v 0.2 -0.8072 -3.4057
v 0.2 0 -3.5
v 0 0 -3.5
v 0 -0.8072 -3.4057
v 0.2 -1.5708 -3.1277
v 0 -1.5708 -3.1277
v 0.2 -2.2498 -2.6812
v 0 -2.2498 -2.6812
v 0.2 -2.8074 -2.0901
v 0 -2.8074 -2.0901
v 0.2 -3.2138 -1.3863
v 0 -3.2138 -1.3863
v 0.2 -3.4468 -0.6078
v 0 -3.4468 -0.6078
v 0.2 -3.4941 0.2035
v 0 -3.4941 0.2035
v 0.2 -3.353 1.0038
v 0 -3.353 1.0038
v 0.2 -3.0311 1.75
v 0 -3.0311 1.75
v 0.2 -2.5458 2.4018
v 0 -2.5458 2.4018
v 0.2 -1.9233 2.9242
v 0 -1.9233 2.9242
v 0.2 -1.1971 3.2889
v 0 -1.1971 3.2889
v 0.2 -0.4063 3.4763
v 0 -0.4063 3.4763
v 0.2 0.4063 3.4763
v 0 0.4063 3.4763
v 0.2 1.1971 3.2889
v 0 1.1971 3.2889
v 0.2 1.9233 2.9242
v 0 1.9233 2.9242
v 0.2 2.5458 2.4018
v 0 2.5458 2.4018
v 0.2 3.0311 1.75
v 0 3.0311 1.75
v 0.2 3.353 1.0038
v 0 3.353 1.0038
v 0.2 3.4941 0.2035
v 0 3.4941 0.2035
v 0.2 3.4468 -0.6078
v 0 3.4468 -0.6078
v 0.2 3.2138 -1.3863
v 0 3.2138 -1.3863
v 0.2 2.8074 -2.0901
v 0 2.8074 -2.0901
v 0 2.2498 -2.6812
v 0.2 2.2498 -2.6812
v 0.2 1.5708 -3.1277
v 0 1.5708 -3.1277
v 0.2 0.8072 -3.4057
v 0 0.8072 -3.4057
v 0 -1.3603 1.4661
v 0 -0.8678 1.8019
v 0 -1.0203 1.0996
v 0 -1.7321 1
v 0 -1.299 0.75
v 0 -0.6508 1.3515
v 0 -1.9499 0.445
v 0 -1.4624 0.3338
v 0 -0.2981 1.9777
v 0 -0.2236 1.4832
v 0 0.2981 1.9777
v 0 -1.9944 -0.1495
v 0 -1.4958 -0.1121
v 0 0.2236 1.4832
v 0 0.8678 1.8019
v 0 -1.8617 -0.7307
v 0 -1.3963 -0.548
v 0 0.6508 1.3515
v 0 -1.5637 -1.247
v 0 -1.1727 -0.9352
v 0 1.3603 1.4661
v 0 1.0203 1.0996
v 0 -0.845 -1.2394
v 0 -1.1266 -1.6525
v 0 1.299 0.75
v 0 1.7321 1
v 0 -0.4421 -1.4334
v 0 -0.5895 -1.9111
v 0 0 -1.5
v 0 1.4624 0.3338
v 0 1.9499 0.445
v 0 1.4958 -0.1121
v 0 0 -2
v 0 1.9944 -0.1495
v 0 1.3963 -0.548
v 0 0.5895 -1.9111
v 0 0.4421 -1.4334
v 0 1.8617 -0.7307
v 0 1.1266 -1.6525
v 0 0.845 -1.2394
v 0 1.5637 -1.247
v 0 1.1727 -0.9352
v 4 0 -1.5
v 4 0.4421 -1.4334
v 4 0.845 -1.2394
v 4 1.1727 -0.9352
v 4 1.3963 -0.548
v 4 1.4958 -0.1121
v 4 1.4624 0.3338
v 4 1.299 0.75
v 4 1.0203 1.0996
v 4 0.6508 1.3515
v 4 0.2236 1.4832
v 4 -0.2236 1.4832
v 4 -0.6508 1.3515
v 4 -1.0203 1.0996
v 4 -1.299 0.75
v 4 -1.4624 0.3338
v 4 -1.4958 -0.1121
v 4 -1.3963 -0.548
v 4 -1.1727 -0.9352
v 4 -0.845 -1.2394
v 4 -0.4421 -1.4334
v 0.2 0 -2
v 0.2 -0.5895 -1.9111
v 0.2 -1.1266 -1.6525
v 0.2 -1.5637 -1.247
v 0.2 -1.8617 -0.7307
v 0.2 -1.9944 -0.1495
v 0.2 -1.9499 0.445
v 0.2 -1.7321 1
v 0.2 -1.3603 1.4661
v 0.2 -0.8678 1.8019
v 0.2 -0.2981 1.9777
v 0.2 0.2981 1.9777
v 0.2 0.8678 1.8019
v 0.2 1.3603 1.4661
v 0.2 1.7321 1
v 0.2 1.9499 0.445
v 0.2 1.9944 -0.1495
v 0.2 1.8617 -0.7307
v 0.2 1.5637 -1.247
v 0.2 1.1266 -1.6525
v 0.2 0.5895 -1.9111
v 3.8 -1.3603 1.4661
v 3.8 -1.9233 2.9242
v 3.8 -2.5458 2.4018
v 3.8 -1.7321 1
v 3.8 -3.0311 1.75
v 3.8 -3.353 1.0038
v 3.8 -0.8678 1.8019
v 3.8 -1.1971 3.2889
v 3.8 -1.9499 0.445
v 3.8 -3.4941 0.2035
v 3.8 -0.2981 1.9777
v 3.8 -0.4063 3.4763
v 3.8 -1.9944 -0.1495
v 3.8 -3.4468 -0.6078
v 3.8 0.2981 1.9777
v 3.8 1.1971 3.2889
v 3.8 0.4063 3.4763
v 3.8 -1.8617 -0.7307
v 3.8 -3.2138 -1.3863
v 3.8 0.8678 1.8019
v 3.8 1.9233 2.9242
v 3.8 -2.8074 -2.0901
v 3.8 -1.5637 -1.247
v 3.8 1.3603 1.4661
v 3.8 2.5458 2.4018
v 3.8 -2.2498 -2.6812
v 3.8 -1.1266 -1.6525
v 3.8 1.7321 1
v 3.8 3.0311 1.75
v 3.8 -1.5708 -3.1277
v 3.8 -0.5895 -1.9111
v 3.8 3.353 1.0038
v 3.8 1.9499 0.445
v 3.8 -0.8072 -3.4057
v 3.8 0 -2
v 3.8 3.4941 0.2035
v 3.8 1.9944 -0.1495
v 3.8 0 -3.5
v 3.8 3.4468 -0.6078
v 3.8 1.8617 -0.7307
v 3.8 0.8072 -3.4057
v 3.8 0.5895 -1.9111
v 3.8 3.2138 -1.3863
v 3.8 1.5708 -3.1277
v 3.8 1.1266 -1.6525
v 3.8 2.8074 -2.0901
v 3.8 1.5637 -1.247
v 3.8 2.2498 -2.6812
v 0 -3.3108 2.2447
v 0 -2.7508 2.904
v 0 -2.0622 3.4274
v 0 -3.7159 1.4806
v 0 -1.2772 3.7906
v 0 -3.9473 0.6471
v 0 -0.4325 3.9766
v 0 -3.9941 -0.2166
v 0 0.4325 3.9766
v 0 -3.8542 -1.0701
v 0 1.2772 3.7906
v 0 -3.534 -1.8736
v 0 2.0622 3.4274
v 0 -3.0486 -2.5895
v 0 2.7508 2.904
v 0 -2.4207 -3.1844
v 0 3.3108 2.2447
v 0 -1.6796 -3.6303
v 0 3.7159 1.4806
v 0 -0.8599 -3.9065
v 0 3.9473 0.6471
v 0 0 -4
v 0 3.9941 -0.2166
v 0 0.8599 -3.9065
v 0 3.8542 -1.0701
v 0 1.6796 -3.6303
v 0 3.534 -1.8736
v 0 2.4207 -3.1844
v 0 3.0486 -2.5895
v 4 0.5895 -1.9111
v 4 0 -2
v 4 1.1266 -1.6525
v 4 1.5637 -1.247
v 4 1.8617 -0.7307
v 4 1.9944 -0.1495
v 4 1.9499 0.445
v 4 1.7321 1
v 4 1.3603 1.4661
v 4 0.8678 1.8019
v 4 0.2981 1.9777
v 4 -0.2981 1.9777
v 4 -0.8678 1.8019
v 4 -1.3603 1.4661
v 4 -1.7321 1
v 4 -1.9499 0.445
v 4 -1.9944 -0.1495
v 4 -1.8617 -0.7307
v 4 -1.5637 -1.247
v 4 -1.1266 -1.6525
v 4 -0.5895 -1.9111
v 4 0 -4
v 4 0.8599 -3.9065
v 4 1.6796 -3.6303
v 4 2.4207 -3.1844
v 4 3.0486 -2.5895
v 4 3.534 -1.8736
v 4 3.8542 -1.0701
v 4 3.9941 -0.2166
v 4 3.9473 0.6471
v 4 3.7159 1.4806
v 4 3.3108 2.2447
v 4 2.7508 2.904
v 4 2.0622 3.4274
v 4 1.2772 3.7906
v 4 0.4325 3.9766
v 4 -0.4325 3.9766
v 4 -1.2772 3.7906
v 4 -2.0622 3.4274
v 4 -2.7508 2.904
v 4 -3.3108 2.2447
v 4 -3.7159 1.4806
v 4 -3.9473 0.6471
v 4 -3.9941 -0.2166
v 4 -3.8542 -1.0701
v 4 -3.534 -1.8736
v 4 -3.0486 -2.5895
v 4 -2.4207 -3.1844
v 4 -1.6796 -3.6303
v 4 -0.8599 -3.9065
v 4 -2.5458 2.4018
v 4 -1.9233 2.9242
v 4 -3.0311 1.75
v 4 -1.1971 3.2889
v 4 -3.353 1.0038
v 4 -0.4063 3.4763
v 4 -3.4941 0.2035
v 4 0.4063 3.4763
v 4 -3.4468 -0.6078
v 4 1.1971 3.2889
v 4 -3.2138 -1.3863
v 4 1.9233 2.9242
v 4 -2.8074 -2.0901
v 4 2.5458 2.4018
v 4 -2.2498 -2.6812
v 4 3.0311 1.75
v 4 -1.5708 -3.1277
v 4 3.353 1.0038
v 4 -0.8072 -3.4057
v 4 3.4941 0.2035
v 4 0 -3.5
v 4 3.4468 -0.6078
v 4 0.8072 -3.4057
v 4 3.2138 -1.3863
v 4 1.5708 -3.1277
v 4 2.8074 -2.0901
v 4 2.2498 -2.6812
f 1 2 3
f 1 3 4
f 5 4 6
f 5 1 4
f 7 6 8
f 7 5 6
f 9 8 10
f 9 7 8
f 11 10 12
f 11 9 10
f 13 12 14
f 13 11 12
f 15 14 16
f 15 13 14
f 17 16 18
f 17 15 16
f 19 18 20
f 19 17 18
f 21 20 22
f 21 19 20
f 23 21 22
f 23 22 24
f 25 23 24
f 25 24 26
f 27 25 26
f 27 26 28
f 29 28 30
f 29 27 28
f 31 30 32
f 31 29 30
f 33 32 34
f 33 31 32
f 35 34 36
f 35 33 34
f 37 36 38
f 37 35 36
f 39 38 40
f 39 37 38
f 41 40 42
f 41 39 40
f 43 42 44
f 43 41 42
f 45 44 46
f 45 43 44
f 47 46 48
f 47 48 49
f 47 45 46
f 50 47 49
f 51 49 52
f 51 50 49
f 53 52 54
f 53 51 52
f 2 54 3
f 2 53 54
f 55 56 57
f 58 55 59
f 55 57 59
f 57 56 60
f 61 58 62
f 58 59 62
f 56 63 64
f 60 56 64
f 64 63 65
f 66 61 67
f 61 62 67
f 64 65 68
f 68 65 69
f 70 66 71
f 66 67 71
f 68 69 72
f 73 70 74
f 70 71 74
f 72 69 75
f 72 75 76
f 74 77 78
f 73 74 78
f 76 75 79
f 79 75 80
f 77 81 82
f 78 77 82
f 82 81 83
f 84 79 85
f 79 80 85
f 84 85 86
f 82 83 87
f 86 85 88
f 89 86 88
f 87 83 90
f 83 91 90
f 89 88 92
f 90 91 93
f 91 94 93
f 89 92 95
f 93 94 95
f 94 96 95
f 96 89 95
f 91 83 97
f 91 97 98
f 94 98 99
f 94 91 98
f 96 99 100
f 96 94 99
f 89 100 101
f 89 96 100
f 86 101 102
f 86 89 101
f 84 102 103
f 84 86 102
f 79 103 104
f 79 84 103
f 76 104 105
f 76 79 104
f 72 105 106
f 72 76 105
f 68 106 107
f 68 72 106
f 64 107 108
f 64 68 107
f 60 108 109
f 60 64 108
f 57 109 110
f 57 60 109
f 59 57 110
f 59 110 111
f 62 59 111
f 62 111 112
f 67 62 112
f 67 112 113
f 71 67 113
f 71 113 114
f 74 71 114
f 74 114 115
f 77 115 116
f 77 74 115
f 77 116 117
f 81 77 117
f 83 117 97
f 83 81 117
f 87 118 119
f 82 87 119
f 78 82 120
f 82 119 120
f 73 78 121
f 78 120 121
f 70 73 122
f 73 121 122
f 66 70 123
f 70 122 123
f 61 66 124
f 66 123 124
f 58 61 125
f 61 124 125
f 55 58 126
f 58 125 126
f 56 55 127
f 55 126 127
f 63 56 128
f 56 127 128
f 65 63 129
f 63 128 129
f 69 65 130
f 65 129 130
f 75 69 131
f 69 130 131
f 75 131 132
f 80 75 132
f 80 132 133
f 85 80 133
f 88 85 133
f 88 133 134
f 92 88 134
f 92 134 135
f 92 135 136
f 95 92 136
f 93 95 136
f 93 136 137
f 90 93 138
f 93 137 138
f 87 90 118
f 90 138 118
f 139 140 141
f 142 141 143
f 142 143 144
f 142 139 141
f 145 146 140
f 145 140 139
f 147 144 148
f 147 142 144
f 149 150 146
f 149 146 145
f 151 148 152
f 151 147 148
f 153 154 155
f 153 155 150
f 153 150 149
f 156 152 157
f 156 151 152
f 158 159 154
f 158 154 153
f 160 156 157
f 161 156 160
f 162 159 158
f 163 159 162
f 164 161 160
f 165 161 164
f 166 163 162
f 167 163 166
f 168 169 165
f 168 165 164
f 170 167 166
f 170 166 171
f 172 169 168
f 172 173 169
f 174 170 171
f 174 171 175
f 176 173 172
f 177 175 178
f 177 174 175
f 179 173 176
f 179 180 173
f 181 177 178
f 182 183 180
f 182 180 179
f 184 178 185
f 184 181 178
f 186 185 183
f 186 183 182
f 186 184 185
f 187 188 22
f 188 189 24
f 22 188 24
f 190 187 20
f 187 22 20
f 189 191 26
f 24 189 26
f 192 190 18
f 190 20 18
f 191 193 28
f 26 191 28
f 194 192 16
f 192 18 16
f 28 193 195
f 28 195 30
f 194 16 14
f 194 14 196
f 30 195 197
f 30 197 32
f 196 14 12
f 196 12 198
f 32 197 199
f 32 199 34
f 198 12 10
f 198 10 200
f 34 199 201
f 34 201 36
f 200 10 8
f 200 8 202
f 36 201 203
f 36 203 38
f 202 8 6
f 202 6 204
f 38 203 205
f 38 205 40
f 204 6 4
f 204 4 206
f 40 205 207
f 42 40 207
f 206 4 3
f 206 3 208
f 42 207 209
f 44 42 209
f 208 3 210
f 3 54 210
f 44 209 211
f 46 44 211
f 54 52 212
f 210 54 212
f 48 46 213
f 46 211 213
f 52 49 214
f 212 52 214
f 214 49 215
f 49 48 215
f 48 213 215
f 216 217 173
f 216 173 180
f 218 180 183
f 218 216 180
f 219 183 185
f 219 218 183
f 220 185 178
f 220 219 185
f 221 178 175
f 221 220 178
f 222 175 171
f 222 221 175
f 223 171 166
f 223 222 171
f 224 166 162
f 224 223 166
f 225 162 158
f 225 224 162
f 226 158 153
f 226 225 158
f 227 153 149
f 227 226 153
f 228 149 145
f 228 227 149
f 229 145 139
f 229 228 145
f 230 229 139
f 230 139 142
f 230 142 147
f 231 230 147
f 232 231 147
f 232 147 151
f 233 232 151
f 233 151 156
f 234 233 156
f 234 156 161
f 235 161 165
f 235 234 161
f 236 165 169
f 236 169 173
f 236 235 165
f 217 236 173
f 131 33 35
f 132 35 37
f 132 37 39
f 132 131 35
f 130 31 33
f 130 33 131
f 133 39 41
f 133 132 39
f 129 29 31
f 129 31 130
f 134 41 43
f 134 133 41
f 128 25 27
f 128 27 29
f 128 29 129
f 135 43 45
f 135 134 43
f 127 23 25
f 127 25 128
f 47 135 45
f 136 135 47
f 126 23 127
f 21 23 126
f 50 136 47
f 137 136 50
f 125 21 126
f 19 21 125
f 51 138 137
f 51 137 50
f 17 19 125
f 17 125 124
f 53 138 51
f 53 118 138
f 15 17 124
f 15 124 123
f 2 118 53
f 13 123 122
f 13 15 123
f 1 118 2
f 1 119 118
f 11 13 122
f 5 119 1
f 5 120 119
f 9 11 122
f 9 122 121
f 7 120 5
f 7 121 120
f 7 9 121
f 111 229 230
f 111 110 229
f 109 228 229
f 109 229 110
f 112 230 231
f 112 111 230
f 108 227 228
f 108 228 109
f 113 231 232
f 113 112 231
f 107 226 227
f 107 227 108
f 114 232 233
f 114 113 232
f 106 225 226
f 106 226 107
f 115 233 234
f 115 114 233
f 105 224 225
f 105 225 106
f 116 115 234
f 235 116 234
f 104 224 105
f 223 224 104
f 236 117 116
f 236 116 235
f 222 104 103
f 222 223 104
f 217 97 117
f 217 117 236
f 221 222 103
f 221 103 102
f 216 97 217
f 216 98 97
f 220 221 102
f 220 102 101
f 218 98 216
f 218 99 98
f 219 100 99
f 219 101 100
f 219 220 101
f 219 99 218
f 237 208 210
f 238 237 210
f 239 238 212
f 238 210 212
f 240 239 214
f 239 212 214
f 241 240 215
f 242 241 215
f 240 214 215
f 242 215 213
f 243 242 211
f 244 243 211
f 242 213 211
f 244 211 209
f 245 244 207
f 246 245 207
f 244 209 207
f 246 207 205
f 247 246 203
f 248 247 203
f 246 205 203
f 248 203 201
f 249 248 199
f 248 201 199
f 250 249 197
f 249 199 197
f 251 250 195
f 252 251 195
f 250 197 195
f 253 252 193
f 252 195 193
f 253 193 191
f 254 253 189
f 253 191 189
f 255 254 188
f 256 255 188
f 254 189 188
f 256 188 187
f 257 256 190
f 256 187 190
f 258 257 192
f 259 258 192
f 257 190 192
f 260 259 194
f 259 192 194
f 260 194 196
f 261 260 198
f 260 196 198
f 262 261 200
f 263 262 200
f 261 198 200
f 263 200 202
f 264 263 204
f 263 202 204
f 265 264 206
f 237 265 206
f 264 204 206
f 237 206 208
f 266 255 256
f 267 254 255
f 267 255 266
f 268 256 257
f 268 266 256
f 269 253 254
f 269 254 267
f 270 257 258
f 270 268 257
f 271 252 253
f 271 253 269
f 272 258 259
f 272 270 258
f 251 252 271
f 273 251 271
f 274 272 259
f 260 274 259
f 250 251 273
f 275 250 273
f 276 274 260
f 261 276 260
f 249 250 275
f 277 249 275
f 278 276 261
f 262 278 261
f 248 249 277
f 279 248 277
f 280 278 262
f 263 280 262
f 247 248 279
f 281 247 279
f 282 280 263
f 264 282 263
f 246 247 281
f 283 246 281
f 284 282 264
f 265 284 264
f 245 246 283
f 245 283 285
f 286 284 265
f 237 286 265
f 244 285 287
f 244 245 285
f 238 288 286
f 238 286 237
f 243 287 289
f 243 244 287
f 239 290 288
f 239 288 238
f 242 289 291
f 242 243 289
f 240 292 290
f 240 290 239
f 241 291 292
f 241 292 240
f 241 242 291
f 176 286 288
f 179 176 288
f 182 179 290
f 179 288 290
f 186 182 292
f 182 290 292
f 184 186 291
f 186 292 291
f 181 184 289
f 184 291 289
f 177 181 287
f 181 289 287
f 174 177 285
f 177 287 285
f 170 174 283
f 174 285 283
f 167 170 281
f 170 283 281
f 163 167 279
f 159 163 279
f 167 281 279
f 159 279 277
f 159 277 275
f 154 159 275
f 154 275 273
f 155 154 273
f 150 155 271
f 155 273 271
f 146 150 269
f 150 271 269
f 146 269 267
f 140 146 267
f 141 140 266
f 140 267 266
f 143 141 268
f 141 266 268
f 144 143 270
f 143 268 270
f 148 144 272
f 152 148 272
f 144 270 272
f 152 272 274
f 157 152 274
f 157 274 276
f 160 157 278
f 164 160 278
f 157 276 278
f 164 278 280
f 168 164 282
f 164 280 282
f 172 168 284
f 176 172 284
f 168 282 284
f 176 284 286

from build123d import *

# Parameters (mm, degrees)
SKETCH1_R           = 4
SKETCH1_R_2         = 1.5
BOSS_EXTRUDE1_DEPTH = 4
SKETCH2_R           = 3.5
SKETCH2_R_2         = 2
CUT_EXTRUDE1_DEPTH  = 0.2
CUT_EXTRUDE2_START  = -0.2
SKETCH3_R           = 3.5
SKETCH3_R_2         = 2
CUT_EXTRUDE2_DEPTH  = 0.2


with BuildPart() as part:
    # Sketch1 → Boss-Extrude1 (new body)
    with BuildSketch(Plane(origin=(0, 0, 0), x_dir=(0, 0, -1), z_dir=(1, 0, 0))):
        Circle(SKETCH1_R)
        Circle(SKETCH1_R_2, mode=Mode.SUBTRACT)
    extrude(amount=BOSS_EXTRUDE1_DEPTH)

    # Sketch2 → Cut-Extrude1 (cut)
    with BuildSketch(Plane(origin=(4, 0, 0), x_dir=(0, 0, -1), z_dir=(1, 0, 0))):
        Circle(SKETCH2_R)
        Circle(SKETCH2_R_2, mode=Mode.SUBTRACT)
    extrude(amount=-CUT_EXTRUDE1_DEPTH, mode=Mode.SUBTRACT)

    # Sketch3 → Cut-Extrude2 (cut)
    with BuildSketch(Plane.ZY.offset(CUT_EXTRUDE2_START)):
        with Locations(Location((0, 0, 0), (0, 0, 180))):
            Circle(SKETCH3_R)
        with Locations(Location((0, 0, 0), (0, 0, 180))):
            Circle(SKETCH3_R_2, mode=Mode.SUBTRACT)
    extrude(amount=CUT_EXTRUDE2_DEPTH, mode=Mode.SUBTRACT)


solid = part.part
